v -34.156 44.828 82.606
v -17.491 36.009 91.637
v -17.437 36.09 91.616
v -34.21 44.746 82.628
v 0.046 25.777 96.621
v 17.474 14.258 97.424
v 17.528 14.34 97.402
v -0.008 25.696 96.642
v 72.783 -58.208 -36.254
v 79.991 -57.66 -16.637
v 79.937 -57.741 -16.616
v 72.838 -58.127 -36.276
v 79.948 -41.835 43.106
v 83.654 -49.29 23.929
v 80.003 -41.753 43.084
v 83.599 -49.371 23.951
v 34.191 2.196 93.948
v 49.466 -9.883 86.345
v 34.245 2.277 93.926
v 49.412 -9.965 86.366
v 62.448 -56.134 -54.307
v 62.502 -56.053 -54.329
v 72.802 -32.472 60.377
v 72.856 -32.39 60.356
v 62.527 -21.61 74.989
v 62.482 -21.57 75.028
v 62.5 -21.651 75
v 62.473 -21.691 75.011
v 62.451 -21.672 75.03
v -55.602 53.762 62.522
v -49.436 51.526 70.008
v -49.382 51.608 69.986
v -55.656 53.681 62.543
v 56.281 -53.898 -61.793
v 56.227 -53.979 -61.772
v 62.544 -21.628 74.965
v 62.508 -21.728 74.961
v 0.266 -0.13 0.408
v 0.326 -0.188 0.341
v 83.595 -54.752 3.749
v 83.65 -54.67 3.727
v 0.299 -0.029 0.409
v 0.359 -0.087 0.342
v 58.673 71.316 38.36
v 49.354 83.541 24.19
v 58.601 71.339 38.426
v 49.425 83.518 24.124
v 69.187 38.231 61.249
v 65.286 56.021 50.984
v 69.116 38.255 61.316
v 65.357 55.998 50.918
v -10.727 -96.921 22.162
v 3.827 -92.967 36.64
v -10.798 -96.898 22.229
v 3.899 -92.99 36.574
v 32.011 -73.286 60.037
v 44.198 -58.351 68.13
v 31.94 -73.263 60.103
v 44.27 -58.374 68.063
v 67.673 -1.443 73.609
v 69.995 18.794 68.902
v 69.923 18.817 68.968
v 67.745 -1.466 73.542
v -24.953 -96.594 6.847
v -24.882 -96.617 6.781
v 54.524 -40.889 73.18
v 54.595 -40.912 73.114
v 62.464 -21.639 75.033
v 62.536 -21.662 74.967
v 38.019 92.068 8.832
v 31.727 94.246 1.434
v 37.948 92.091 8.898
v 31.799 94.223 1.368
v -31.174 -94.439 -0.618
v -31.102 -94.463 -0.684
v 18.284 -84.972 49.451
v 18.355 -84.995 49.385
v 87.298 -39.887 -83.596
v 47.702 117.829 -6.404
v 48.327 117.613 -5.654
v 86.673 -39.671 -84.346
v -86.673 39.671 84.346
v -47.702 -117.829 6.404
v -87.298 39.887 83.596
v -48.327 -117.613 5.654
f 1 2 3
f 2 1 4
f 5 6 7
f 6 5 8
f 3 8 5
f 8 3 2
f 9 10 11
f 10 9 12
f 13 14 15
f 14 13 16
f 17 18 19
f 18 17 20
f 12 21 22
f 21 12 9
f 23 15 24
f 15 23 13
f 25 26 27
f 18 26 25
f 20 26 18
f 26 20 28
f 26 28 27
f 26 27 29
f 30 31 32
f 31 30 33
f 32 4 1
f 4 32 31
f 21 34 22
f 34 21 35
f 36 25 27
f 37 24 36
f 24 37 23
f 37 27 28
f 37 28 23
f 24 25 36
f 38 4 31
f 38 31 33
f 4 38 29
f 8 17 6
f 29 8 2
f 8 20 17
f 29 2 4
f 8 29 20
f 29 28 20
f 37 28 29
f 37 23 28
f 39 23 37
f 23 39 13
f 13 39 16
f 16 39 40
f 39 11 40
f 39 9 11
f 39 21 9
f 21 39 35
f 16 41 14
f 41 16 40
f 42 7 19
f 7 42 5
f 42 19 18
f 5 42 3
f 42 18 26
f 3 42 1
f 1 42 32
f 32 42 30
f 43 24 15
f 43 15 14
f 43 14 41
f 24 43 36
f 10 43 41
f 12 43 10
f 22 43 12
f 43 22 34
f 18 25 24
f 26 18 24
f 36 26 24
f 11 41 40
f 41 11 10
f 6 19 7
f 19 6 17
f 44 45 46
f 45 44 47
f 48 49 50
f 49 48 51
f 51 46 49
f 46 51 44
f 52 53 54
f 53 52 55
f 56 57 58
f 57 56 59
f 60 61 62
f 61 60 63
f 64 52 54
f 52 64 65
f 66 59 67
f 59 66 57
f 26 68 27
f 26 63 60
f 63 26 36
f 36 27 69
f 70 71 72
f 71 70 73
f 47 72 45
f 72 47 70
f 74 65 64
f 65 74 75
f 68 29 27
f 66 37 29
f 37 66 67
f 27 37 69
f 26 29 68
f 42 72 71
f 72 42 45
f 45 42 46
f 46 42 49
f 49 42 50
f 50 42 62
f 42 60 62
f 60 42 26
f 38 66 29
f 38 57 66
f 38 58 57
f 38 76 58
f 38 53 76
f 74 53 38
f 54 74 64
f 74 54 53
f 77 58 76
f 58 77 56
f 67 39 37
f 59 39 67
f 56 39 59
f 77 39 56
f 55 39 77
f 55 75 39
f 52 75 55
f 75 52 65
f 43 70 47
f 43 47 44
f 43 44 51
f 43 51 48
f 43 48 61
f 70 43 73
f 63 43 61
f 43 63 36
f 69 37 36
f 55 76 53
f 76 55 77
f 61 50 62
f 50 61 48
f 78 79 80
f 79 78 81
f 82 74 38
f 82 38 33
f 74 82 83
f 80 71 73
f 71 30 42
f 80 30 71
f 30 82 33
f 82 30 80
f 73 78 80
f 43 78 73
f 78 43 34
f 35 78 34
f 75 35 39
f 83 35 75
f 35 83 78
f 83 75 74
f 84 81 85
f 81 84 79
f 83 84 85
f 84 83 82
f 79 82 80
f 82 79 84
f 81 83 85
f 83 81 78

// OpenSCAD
rotate([30,30,30])
{
    color("silver")
        cube([180,180,1], center=true);

    color([1.0,0,0,0.5])    
        rotate([0,90, 30])
            intersection() 
            {
                translate([-100,0,0]) 
                    cube([200,200,200], center=true);
                cylinder(.1, r=100, center=true);
            }
            
    color([0.0,1,0,0.5])    
        rotate([0,90, -40])
            intersection() 
            {
                translate([-100,0,0]) 
                    cube([200,200,200], center=true);
                cylinder(.1, r=100, center=true);
            }
}
